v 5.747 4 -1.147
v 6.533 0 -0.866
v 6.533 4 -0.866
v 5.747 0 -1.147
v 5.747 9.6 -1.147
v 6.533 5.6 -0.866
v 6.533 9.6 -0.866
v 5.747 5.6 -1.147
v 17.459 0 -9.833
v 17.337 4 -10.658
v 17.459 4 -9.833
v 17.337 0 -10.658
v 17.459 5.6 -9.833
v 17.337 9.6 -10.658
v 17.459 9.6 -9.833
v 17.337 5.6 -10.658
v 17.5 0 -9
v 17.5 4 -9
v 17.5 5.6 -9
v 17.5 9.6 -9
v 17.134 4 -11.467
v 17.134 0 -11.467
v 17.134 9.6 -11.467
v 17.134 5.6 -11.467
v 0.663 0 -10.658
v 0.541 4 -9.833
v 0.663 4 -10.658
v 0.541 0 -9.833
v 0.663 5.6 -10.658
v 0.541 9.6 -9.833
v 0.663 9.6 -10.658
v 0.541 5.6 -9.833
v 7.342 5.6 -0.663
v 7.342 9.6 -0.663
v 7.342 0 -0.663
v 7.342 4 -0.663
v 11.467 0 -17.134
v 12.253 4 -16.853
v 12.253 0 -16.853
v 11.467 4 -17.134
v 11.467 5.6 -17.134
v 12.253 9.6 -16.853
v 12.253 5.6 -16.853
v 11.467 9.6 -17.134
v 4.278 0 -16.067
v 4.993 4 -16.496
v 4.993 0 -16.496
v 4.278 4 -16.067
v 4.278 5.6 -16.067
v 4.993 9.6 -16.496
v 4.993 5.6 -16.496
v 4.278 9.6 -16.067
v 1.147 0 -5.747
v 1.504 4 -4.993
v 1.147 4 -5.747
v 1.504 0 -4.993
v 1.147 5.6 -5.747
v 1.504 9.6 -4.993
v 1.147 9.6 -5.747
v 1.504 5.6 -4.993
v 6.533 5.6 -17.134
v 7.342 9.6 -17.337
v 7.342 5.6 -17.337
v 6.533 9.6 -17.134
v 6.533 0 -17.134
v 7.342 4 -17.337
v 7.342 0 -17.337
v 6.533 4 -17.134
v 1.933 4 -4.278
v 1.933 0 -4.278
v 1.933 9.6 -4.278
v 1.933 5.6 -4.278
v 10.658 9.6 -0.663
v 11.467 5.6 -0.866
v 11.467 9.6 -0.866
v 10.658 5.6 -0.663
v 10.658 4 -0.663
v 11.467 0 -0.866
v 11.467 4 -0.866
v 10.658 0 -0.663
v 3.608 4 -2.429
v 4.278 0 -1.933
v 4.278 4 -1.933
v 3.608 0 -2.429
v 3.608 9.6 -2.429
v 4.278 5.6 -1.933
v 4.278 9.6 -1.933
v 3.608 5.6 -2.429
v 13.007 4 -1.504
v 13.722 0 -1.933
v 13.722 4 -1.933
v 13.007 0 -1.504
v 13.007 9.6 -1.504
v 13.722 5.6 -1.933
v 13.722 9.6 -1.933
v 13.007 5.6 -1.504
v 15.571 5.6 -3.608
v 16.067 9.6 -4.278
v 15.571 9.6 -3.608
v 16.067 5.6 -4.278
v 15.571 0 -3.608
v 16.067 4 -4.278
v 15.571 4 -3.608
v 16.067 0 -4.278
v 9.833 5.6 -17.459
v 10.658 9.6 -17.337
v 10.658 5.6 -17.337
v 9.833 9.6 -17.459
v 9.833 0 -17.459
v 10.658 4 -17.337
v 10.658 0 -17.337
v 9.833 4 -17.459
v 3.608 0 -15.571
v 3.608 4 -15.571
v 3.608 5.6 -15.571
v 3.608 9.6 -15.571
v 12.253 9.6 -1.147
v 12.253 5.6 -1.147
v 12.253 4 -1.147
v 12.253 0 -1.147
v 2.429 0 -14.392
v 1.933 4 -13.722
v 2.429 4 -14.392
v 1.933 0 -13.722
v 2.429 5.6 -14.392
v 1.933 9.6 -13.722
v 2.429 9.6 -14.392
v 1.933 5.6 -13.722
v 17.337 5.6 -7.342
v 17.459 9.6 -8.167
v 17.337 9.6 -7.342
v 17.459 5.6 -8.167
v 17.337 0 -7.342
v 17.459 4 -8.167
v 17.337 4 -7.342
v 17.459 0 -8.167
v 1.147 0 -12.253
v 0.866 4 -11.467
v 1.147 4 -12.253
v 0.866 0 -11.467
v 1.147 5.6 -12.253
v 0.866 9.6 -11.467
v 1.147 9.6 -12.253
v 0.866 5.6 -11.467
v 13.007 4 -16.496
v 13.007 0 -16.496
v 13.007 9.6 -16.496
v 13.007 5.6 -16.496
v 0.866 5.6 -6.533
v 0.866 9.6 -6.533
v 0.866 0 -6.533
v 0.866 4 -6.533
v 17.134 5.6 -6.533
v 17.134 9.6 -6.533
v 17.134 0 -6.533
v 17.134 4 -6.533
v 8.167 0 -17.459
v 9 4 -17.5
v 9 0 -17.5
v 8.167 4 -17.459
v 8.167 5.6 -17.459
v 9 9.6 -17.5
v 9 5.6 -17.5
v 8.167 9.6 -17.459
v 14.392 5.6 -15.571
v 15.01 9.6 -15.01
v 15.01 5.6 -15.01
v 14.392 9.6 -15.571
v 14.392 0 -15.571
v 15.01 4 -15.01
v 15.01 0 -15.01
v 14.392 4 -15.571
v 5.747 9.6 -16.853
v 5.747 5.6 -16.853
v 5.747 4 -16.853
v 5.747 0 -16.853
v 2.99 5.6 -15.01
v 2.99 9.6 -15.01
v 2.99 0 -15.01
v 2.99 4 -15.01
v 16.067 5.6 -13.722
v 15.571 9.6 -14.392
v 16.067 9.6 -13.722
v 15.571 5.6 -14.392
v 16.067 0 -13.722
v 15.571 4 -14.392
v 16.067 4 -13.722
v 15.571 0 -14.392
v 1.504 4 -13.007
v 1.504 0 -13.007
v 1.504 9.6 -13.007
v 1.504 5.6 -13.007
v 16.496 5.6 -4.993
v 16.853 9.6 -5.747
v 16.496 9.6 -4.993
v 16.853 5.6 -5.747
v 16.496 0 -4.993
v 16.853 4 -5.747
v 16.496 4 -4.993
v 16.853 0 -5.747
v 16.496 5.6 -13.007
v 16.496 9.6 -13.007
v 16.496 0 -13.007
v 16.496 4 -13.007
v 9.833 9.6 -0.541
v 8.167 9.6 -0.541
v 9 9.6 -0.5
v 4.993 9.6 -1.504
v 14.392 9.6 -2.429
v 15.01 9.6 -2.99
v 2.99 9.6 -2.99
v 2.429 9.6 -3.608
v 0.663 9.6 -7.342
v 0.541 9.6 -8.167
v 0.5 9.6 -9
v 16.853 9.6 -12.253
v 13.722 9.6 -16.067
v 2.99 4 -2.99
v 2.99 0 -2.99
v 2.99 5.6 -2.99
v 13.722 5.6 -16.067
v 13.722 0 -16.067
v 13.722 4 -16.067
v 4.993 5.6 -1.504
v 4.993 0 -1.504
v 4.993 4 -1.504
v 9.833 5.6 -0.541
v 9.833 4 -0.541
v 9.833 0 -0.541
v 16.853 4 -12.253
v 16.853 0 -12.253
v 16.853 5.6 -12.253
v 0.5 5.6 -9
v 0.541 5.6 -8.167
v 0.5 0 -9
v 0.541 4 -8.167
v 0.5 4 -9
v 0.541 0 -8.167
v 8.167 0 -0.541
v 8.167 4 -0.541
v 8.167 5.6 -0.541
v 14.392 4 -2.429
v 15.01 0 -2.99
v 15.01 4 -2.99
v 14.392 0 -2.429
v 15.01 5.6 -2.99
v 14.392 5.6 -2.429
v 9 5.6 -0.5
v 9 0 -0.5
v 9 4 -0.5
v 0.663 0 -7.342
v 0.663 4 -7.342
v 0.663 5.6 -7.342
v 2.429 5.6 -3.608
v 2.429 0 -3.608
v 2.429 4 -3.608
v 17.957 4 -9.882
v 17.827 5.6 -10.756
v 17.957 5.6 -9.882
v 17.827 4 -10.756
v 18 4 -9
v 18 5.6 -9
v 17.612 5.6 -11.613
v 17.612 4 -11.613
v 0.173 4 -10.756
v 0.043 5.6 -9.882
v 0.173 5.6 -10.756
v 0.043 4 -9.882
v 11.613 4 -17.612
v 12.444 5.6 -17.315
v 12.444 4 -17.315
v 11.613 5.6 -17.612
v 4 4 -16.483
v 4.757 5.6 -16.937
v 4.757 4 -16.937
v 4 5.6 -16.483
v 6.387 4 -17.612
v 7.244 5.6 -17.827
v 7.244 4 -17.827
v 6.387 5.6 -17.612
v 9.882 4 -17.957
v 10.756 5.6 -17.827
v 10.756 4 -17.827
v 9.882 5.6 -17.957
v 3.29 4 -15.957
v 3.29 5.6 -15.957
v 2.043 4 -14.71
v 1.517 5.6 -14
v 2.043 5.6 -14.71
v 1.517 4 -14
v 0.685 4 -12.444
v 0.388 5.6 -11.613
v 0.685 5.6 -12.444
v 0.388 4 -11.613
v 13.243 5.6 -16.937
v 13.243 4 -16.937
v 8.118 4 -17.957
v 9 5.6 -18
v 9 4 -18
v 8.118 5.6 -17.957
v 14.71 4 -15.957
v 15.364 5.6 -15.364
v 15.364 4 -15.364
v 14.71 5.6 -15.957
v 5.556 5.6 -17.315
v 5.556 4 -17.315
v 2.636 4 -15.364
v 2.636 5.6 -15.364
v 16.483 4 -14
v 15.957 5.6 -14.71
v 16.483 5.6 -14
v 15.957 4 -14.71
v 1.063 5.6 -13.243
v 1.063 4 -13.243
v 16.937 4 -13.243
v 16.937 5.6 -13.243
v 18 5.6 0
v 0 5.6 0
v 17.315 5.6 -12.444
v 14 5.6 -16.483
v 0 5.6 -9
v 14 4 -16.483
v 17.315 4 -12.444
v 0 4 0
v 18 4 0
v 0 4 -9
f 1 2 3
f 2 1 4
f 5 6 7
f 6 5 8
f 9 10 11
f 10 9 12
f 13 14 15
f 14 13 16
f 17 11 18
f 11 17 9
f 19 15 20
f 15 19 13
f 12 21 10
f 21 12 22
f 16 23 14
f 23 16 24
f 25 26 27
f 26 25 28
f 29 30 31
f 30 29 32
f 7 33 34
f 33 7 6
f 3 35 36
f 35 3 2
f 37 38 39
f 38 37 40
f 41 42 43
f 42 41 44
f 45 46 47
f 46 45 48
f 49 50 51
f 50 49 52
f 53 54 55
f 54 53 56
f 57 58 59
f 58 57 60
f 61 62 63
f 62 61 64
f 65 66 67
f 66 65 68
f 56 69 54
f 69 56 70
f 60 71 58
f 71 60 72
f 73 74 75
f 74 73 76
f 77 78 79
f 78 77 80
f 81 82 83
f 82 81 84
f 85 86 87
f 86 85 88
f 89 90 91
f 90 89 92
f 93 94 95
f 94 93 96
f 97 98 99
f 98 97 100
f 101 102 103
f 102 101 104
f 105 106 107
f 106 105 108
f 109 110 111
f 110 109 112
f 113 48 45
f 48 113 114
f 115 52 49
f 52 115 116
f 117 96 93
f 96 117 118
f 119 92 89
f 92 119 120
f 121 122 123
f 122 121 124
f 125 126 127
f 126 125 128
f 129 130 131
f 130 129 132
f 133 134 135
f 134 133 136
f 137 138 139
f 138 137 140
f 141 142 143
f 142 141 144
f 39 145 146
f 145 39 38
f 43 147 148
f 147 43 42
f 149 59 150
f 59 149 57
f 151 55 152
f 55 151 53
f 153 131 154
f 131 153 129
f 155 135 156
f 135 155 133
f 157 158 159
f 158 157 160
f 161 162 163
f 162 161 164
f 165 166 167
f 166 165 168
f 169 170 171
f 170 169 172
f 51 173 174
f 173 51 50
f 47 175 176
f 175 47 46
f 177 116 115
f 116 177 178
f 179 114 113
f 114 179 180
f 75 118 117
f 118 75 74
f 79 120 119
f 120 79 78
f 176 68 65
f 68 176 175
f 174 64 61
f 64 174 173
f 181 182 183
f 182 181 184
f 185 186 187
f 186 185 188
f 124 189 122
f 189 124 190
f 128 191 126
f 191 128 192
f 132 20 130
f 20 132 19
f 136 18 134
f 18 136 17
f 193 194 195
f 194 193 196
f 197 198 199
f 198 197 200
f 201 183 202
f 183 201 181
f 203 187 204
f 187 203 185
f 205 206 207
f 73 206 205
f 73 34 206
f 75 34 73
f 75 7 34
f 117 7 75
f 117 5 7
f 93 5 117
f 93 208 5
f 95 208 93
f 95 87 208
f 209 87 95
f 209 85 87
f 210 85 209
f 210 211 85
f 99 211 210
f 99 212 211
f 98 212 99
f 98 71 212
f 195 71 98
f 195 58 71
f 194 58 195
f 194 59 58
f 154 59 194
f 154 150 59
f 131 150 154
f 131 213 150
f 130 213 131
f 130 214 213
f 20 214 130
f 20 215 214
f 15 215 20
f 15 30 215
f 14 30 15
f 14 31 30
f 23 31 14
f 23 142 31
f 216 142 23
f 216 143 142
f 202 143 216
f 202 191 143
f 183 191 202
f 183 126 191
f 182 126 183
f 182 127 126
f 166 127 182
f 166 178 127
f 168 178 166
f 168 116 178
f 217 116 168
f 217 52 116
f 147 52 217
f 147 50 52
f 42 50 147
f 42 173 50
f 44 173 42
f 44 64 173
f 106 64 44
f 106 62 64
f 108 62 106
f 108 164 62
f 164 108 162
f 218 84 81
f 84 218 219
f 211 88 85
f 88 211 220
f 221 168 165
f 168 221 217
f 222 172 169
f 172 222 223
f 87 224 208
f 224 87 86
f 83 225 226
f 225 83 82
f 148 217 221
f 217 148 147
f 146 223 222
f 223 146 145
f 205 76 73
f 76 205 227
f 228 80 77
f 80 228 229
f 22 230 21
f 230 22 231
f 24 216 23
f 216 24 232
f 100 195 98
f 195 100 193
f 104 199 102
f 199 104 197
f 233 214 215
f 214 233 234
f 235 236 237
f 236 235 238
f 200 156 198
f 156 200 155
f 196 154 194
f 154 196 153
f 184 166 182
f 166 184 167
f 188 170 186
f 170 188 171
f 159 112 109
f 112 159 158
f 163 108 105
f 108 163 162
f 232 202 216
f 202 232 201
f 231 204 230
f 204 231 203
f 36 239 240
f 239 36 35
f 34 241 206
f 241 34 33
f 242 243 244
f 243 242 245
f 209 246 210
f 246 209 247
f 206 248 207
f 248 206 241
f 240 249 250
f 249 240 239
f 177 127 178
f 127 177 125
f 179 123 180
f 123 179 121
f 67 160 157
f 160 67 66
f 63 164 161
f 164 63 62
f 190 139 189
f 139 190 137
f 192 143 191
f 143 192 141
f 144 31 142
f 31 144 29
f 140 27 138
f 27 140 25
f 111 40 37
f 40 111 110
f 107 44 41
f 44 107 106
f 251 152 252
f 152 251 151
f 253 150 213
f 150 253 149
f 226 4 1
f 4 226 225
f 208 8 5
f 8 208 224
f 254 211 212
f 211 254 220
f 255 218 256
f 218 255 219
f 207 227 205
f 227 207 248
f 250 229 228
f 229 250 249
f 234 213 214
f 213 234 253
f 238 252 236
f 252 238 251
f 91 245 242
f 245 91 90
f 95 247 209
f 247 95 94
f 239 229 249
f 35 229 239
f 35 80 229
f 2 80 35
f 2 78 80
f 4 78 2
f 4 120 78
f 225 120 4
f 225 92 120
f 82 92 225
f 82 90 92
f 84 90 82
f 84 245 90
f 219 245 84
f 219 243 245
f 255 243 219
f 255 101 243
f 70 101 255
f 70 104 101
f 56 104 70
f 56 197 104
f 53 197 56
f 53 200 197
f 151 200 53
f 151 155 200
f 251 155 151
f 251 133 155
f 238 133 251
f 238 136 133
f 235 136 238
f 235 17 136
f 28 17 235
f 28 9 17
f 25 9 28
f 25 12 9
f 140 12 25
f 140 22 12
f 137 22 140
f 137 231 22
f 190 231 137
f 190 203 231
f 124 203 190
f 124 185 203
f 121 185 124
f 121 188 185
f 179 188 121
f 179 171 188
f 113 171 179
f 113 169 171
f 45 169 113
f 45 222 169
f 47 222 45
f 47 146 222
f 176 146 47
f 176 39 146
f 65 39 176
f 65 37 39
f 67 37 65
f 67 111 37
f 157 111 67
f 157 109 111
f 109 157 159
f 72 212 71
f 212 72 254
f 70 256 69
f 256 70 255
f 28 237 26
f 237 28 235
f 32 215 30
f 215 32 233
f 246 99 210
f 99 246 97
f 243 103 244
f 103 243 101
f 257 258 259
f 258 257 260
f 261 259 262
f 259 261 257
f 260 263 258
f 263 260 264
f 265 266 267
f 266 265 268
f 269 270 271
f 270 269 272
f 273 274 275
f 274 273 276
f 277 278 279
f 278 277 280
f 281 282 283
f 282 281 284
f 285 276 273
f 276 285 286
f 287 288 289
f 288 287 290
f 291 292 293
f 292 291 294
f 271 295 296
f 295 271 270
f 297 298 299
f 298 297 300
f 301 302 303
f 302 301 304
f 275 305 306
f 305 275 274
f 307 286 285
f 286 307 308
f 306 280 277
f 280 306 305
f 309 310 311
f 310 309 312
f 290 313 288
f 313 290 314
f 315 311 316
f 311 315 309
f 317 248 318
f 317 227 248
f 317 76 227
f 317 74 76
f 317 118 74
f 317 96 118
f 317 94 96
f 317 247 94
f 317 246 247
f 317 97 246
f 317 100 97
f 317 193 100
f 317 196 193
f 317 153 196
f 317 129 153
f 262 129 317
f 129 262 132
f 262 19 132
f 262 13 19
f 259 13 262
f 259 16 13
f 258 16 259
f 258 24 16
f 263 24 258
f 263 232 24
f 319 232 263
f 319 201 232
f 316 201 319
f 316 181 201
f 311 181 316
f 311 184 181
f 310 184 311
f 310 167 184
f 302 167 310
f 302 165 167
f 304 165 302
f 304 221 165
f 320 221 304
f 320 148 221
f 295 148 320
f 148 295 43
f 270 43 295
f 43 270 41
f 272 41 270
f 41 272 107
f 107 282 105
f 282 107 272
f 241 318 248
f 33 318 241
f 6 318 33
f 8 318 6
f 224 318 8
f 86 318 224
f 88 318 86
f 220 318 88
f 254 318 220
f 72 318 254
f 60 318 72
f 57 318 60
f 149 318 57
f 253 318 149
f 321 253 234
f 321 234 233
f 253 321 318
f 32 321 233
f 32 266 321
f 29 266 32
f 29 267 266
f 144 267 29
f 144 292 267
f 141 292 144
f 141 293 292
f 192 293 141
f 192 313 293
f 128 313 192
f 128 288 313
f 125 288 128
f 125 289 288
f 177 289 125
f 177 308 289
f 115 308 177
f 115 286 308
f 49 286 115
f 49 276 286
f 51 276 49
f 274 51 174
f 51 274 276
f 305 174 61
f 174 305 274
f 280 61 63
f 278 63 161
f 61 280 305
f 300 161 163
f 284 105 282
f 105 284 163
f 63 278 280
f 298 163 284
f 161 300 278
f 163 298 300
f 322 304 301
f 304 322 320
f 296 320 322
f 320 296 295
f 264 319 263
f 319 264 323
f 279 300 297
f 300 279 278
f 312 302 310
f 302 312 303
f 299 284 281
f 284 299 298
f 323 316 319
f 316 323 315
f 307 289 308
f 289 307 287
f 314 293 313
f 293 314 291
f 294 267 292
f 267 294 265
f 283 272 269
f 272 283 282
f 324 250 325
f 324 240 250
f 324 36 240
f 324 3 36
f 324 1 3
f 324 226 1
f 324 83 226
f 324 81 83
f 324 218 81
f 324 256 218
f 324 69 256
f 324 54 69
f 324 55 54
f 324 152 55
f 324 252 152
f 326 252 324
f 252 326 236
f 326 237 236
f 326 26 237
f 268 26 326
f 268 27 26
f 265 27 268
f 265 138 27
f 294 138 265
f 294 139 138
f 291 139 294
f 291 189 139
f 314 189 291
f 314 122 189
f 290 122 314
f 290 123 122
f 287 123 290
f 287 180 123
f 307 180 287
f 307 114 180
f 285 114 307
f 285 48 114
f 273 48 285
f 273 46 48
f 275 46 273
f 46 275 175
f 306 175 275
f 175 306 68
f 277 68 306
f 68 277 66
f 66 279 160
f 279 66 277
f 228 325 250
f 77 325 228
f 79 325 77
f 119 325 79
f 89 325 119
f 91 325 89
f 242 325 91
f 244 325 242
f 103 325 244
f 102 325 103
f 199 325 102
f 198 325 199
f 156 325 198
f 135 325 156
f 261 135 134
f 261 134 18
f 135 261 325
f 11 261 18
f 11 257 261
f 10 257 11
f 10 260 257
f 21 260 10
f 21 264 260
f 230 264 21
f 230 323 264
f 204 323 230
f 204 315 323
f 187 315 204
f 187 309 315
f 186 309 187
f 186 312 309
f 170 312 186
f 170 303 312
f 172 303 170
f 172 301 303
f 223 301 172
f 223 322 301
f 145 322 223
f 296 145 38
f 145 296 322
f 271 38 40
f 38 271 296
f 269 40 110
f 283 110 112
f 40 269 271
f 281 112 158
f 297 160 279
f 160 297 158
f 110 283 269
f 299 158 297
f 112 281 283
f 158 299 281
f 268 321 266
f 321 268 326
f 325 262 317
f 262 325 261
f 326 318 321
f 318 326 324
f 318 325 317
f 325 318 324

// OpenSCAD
// module for just the socket part of the mayflash adapter
// https://www.amazon.com/Mayflash-GameCube-Controller-Adapter-Switch/dp/B00RSXRLUE
// really just the black plastic part at the tip

// renders vertically with the controller port facing "forward".
// the top _should_ line up with the precise edge of the ports PCB

$fn = 64;

// "socket" = the round part
socketWidth = ceil(16.93);
socketRadius = socketWidth/2;
socketDepth = ceil(3.8);
// "plate" = the bigger part that we're going to use to hold the things in place
plateWidth = ceil(17.88);
plateRadius = plateWidth/2;
plateDepth = 1.6;
// "extension" = how far back to pretend the socket goes for spacing/arrangement
extensionDepth = socketDepth;

module mayflashSocket() {
    rotate([-90, 0, 0]) union() {
        // socket + extension
        translate([plateRadius, plateRadius, 0])
            cylinder(d = socketWidth, h = socketDepth + plateDepth + extensionDepth);
        // plate (really a cylinder + a rect)
        translate([plateRadius, plateRadius, extensionDepth])
            cylinder(d = plateWidth, h = plateDepth);
        translate([0, 0, extensionDepth])
            cube([plateWidth, plateRadius, plateDepth]); 
    };
}

mayflashSocket();
